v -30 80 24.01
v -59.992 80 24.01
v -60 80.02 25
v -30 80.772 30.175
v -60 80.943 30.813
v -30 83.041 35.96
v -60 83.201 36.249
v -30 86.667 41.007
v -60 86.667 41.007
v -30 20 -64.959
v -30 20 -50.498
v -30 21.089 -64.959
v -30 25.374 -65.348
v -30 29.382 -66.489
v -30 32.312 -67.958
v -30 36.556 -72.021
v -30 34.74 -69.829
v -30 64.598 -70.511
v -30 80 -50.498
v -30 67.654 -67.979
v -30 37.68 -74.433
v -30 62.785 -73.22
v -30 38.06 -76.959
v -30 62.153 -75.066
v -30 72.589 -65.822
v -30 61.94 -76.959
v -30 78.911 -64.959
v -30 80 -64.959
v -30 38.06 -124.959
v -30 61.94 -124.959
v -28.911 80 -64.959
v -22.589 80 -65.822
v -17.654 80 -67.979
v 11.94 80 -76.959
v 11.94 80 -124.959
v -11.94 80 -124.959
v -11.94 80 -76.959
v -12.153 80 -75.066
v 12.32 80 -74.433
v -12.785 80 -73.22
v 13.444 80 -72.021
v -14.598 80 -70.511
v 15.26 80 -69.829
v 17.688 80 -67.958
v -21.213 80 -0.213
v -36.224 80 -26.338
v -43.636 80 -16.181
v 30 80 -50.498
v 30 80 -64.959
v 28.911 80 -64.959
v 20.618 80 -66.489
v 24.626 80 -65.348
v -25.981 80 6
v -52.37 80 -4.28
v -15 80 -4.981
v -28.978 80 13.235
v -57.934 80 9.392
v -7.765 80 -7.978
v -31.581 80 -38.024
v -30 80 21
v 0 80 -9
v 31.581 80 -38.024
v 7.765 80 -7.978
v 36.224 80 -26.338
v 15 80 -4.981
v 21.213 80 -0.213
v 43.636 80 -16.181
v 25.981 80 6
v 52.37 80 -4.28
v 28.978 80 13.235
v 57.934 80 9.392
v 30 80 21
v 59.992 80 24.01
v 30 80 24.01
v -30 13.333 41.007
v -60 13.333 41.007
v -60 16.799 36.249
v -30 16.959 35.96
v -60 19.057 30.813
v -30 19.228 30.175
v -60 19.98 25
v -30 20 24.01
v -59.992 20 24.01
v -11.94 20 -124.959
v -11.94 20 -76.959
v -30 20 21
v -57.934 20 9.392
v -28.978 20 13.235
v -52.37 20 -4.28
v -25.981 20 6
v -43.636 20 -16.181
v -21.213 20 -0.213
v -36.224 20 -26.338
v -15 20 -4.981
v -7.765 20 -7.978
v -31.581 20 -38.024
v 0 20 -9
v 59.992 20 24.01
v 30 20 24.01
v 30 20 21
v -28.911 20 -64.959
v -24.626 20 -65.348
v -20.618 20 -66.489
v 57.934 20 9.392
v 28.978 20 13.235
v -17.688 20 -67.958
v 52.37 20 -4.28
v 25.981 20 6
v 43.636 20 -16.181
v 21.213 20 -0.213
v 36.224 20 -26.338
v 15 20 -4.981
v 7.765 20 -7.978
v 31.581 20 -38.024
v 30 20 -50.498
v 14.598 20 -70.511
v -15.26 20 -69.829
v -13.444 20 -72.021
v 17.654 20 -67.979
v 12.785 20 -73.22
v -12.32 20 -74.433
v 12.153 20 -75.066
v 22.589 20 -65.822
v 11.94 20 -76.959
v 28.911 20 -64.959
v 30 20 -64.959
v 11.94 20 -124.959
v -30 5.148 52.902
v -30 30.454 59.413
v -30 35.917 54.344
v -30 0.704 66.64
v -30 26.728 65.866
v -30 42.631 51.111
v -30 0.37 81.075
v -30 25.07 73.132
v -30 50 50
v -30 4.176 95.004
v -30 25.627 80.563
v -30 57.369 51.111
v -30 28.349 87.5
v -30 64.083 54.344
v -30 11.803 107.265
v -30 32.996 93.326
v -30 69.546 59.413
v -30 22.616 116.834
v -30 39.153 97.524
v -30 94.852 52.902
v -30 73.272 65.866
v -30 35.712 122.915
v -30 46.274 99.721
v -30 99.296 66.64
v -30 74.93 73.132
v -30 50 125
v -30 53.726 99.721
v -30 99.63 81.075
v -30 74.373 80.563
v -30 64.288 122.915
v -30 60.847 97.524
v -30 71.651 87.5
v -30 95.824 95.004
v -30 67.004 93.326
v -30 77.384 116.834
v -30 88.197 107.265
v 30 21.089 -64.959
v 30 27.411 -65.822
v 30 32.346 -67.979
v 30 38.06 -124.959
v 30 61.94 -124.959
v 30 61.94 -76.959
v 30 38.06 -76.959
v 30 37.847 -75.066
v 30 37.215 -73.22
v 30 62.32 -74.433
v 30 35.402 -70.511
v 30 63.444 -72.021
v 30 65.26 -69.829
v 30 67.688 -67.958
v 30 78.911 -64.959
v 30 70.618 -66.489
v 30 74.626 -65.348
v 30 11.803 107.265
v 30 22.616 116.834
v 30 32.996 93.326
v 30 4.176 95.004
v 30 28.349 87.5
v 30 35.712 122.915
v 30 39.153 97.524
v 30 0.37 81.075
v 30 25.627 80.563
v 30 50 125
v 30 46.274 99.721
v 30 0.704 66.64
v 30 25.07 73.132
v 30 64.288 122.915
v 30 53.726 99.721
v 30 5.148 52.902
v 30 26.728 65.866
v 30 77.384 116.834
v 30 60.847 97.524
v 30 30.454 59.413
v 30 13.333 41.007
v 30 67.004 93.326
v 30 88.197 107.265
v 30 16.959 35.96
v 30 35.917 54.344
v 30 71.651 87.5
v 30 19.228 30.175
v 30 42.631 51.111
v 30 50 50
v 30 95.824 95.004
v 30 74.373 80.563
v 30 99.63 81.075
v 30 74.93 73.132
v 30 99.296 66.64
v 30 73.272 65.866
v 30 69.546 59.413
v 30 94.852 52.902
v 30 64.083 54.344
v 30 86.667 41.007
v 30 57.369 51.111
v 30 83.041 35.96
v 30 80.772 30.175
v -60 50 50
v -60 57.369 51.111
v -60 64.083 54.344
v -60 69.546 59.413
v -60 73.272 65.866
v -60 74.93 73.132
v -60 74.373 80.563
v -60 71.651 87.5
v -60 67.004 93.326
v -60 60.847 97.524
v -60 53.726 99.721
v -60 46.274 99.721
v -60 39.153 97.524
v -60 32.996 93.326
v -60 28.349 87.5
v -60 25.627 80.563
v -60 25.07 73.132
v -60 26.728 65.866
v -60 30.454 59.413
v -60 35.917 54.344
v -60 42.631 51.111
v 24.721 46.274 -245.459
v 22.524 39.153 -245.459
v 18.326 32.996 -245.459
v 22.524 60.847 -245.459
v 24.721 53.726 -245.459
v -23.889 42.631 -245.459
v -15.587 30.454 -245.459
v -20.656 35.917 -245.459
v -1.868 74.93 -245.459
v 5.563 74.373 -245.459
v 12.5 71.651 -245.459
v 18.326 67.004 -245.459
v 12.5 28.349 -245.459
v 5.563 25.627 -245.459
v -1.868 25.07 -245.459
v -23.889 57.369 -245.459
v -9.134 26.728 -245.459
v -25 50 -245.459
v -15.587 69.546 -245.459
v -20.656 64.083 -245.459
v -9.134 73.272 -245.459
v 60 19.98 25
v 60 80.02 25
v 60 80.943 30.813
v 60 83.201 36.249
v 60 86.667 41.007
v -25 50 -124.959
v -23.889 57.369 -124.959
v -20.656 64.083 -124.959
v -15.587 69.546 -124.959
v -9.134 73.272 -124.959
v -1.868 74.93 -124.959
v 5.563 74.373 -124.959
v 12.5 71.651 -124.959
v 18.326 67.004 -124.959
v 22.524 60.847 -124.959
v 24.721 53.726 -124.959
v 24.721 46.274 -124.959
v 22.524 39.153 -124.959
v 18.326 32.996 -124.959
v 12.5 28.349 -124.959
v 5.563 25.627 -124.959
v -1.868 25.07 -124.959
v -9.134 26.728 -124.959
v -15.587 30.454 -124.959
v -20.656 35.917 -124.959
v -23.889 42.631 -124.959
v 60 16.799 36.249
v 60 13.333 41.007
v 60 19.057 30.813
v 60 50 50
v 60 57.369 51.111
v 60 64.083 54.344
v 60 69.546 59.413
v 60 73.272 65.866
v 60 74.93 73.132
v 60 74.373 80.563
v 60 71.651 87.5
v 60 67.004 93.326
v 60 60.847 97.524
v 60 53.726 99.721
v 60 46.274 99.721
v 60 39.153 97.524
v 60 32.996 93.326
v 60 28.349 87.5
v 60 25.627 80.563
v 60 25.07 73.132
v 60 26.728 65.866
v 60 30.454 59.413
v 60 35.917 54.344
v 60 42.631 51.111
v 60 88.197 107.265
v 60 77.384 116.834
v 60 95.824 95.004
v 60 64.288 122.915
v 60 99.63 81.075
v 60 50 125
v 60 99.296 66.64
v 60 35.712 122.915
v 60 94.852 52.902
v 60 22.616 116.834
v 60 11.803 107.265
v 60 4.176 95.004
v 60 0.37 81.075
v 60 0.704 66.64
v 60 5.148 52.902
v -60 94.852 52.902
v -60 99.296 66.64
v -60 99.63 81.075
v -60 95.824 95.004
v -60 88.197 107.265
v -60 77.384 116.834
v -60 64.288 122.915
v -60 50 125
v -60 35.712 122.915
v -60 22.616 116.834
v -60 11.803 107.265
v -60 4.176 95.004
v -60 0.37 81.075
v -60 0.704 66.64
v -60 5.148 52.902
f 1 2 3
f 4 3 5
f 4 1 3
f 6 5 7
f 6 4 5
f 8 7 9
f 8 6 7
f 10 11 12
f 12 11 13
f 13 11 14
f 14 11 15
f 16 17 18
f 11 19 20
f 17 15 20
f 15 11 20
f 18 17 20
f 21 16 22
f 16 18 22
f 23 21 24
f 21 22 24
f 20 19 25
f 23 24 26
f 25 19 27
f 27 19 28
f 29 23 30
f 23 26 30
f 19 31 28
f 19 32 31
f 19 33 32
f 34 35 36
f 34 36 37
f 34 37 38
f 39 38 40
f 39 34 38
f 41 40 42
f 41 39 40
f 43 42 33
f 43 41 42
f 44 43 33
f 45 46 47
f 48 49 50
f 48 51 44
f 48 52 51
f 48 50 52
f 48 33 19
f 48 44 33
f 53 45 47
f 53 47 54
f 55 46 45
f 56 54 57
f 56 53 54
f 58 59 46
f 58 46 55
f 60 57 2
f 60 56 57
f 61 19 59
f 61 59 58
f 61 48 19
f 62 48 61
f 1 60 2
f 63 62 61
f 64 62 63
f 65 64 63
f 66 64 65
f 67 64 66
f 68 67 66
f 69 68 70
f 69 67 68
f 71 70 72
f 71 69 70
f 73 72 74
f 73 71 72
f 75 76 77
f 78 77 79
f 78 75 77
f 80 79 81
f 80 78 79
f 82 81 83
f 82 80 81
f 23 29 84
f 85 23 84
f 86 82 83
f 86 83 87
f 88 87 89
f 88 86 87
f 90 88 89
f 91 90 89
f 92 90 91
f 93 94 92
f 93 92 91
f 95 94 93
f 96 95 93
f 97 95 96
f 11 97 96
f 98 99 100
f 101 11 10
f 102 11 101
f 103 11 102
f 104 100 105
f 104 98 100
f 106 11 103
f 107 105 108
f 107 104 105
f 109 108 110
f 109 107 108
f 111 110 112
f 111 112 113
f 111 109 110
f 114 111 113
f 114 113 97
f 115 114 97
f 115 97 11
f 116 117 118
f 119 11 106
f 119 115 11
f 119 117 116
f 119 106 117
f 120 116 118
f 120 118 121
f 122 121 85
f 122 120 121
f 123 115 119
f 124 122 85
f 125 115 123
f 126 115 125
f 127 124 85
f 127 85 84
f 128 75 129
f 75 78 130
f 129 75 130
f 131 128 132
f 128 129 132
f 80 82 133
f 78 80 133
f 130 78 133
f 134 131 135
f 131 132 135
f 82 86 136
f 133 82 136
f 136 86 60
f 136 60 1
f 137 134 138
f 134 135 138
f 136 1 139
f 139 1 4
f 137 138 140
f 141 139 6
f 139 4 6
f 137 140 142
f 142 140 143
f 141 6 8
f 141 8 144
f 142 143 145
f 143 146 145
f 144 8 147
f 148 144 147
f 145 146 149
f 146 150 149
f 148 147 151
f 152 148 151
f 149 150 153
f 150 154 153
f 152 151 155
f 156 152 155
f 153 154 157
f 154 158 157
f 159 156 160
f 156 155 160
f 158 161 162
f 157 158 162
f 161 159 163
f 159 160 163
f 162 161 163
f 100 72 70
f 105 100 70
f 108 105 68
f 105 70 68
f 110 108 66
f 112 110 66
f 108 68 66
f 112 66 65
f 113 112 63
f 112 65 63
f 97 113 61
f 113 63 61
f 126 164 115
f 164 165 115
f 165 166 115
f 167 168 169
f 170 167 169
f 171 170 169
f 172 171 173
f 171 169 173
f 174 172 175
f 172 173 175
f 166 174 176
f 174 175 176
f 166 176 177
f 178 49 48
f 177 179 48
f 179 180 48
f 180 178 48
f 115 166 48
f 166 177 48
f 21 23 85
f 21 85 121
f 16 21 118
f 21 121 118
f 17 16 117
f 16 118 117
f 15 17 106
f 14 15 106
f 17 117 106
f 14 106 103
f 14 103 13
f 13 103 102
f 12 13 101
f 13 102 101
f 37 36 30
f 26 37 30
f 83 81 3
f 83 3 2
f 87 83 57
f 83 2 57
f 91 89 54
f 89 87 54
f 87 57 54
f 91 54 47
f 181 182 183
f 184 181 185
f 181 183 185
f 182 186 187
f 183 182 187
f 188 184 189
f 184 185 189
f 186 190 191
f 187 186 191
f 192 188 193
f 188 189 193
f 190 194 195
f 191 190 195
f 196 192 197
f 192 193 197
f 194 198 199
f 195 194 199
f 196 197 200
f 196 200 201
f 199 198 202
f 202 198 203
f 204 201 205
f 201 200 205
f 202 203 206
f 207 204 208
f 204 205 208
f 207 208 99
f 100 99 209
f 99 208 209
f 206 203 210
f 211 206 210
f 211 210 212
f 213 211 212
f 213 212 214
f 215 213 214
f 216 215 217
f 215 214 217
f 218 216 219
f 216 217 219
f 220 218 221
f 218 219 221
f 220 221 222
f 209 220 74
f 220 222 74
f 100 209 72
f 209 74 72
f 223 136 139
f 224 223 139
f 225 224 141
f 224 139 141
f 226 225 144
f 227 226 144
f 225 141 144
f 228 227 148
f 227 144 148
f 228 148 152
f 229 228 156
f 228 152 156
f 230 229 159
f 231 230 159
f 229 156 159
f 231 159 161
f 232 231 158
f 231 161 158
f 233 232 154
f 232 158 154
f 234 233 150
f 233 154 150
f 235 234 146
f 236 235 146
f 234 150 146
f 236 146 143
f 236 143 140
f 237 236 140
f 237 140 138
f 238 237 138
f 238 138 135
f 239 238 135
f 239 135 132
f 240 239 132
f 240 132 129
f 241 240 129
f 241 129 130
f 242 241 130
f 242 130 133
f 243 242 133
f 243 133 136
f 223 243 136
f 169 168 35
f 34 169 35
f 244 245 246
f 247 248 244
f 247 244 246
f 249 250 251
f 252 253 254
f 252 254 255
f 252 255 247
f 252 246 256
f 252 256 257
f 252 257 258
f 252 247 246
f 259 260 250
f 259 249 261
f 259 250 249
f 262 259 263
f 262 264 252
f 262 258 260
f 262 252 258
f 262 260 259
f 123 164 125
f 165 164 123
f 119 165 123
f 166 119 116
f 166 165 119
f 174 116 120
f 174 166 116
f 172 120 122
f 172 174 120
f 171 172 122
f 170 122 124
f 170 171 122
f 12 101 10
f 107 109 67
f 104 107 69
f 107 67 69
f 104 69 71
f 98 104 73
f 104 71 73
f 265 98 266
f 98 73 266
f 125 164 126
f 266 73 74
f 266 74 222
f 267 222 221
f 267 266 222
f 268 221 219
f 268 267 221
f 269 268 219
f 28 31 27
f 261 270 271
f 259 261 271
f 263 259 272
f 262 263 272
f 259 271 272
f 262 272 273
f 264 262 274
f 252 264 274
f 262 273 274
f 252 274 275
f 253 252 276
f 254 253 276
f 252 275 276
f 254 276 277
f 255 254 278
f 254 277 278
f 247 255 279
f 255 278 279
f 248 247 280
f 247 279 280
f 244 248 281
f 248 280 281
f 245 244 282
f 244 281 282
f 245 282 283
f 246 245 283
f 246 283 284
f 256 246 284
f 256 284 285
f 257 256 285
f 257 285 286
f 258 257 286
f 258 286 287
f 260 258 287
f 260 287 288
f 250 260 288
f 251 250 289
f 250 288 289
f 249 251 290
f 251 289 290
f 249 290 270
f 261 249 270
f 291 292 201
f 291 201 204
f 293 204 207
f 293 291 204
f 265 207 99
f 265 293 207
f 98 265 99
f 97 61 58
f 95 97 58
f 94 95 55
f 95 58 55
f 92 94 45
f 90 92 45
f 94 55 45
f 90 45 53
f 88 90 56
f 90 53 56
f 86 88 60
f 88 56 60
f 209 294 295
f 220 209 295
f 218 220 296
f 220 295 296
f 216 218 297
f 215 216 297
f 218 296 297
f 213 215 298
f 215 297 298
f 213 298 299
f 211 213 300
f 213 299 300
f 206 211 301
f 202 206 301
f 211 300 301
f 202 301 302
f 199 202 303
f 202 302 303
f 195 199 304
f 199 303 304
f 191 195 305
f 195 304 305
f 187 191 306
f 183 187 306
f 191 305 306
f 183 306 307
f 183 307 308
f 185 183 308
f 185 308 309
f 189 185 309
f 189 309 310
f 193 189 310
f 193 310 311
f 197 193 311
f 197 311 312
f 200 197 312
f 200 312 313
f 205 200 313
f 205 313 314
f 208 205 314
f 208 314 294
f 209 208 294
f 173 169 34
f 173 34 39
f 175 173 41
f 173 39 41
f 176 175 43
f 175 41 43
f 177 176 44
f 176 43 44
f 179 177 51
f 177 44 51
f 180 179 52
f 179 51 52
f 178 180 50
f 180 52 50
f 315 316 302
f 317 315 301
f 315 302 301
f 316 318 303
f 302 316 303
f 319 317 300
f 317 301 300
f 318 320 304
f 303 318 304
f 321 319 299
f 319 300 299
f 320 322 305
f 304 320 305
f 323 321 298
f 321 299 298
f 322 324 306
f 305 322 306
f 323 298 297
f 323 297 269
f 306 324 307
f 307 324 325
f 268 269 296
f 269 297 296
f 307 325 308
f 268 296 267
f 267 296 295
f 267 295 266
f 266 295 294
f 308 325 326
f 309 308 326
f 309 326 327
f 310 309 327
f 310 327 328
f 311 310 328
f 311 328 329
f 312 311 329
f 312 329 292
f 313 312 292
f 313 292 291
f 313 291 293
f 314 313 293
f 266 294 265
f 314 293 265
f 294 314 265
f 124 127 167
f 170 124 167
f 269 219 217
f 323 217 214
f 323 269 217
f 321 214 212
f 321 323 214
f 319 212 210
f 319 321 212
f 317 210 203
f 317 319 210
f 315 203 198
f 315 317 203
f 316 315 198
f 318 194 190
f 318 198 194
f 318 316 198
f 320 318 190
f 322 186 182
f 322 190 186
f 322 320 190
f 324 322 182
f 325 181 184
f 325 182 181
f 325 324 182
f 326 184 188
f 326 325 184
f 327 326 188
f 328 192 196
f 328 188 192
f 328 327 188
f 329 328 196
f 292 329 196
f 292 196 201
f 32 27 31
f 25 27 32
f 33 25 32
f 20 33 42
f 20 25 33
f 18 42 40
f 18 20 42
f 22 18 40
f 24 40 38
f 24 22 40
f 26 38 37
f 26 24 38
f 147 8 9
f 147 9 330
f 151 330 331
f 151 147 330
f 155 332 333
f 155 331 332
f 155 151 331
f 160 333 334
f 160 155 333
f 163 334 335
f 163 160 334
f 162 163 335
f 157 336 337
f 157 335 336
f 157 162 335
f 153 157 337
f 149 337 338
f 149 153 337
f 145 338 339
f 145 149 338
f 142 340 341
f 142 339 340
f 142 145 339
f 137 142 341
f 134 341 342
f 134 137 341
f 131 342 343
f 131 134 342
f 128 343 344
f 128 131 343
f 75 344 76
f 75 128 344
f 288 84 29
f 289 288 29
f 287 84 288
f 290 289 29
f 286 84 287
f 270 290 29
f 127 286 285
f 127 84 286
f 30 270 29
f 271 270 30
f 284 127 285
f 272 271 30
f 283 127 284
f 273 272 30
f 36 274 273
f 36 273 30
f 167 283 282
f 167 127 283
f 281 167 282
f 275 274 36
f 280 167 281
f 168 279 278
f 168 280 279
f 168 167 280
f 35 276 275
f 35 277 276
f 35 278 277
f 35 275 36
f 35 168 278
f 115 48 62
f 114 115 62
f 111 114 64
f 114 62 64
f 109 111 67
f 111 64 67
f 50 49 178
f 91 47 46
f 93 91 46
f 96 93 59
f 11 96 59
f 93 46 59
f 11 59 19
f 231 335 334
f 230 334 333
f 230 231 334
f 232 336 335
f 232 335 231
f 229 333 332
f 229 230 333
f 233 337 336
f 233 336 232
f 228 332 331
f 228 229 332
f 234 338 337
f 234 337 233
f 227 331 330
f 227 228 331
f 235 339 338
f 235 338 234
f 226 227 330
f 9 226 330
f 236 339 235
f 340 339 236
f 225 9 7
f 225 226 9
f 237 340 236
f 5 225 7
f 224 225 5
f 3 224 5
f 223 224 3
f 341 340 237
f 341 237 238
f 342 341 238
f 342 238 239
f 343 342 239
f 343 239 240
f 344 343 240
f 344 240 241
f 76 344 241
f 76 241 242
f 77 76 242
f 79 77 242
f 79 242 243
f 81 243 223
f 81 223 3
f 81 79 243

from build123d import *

# Parameters (mm, degrees)
SKETCH1_W           = 120
SKETCH1_H           = 250
BOSS_EXTRUDE1_DEPTH = 100
CUT_EXTRUDE2_DEPTH  = 171.953209973
SKETCH3_R           = 25
CUT_EXTRUDE5_DEPTH  = 201.062490237
CUT_EXTRUDE8_DEPTH  = 60
SKETCH6_R           = 25
BOSS_EXTRUDE2_DEPTH = 120.5
FILLET1_R           = 12


with BuildPart() as part:
    # Sketch1 → Boss-Extrude1 (new body)
    with BuildSketch(Plane(origin=(0, 0, 0), x_dir=(1, 0, 0), z_dir=(0, 1, 0))):
        Rectangle(SKETCH1_W, SKETCH1_H)
    extrude(amount=BOSS_EXTRUDE1_DEPTH)

    # Sketch2 → Cut-Extrude2 (cut, through all)
    with BuildSketch(Plane(origin=(0, 100, 0), x_dir=(1, 0, 0), z_dir=(0, 1, 0))):
        with BuildLine():
            Line((-30, 50.498344353), (-30, 124.968053811))
            Line((-30, 124.968053811), (30, 124.968053811))
            Line((30, 124.968053811), (30, 50.498344353))
            ThreePointArc((30, 50.498344353), (33.533981136, 32.034620706), (43.636363636, 16.180915101))
            ThreePointArc((43.636363636, 16.180915101), (55.759222691, -2.84353176), (60, -25.000000292))
            Line((60, -25.000000292), (60, 125))
            Line((60, 125), (-60, 125))
            Line((-60, 125), (-60, -25))
            ThreePointArc((-60, -25), (-55.759222637, -2.843531624), (-43.636363636, 16.180915101))
            ThreePointArc((-43.636363636, 16.180915101), (-33.533981136, 32.034620706), (-30, 50.498344353))
        make_face()
        with BuildLine():
            ThreePointArc((30, -21), (21.213203436, 0.213203436), (0, 9))
            ThreePointArc((0, 9), (-21.213203436, 0.213203436), (-30, -21))
            Line((-30, -21), (-30, -125))
            Line((-30, -125), (30, -125))
            Line((30, -125), (30, -21))
        make_face()
    extrude(amount=-CUT_EXTRUDE2_DEPTH, mode=Mode.SUBTRACT)

    # Sketch3 → Cut-Extrude5 (cut, through all)
    with BuildSketch(Plane(origin=(60, 0, 0), x_dir=(0, 0, -1), z_dir=(1, 0, 0))):
        with BuildLine():
            Line((-24.009804864, 80), (124.958839528, 80))
            Line((124.958839528, 80), (124.958839528, 20))
            Line((124.958839528, 20), (-24.009804864, 20))
            ThreePointArc((-24.009804864, 20), (-33.138514156, 18.273733406), (-41.006536576, 13.333333333))
            ThreePointArc((-41.006536576, 13.333333333), (-56.742581416, 3.452533187), (-75, 0))
            Line((-75, 0), (124.968053811, 0))
            Line((124.968053811, 0), (124.968053811, 100))
            Line((124.968053811, 100), (-75, 100))
            ThreePointArc((-75, 100), (-56.742581416, 96.547466813), (-41.006536576, 86.666666667))
            ThreePointArc((-41.006536576, 86.666666667), (-33.138514156, 81.726266594), (-24.009804864, 80))
        make_face()
        with BuildLine():
            ThreePointArc((-125, 50), (-110.355339059, 85.355339059), (-75, 100))
            Line((-75, 100), (-125, 100))
            Line((-125, 100), (-125, 50))
        make_face()
        with BuildLine():
            ThreePointArc((-75, 0), (-110.355339059, 14.644660941), (-125, 50))
            Line((-125, 50), (-125, 0))
            Line((-125, 0), (-75, 0))
        make_face()
        with Locations((-75, 50)):
            Circle(SKETCH3_R)
    extrude(amount=-CUT_EXTRUDE5_DEPTH, mode=Mode.SUBTRACT)

    # Sketch4 → Cut-Extrude8 (cut)
    with BuildSketch(Plane(origin=(0, 0, -124.958839528), x_dir=(-1, 0, 0), z_dir=(0, 0, -1))):
        Polygon((11.94, 80), (30, 61.94), (30, 80), align=None)
        Polygon((30, 38.06), (11.94, 20), (30, 20), align=None)
        Polygon((-11.94, 20), (-30, 38.06), (-30, 20), align=None)
        Polygon((-30, 61.94), (-11.94, 80), (-30, 80), align=None)
    extrude(amount=-CUT_EXTRUDE8_DEPTH, mode=Mode.SUBTRACT)

    # Sketch6 → Boss-Extrude2 (add)
    with BuildSketch(Plane(origin=(0, 0, -124.958839528), x_dir=(-1, 0, 0), z_dir=(0, 0, -1))):
        with Locations((0, 50)):
            Circle(SKETCH6_R)
    extrude(amount=BOSS_EXTRUDE2_DEPTH)

    # Fillet1
    fillet1_edges = [part.edges().sort_by_distance(p)[0] for p in [
        (-20.97, 29.03, -64.958839528),
        (-20.97, 70.97, -64.958839528),
        (20.97, 29.03, -64.958839528),
        (20.97, 70.97, -64.958839528),
    ]]
    fillet(fillet1_edges, radius=FILLET1_R)


solid = part.part
